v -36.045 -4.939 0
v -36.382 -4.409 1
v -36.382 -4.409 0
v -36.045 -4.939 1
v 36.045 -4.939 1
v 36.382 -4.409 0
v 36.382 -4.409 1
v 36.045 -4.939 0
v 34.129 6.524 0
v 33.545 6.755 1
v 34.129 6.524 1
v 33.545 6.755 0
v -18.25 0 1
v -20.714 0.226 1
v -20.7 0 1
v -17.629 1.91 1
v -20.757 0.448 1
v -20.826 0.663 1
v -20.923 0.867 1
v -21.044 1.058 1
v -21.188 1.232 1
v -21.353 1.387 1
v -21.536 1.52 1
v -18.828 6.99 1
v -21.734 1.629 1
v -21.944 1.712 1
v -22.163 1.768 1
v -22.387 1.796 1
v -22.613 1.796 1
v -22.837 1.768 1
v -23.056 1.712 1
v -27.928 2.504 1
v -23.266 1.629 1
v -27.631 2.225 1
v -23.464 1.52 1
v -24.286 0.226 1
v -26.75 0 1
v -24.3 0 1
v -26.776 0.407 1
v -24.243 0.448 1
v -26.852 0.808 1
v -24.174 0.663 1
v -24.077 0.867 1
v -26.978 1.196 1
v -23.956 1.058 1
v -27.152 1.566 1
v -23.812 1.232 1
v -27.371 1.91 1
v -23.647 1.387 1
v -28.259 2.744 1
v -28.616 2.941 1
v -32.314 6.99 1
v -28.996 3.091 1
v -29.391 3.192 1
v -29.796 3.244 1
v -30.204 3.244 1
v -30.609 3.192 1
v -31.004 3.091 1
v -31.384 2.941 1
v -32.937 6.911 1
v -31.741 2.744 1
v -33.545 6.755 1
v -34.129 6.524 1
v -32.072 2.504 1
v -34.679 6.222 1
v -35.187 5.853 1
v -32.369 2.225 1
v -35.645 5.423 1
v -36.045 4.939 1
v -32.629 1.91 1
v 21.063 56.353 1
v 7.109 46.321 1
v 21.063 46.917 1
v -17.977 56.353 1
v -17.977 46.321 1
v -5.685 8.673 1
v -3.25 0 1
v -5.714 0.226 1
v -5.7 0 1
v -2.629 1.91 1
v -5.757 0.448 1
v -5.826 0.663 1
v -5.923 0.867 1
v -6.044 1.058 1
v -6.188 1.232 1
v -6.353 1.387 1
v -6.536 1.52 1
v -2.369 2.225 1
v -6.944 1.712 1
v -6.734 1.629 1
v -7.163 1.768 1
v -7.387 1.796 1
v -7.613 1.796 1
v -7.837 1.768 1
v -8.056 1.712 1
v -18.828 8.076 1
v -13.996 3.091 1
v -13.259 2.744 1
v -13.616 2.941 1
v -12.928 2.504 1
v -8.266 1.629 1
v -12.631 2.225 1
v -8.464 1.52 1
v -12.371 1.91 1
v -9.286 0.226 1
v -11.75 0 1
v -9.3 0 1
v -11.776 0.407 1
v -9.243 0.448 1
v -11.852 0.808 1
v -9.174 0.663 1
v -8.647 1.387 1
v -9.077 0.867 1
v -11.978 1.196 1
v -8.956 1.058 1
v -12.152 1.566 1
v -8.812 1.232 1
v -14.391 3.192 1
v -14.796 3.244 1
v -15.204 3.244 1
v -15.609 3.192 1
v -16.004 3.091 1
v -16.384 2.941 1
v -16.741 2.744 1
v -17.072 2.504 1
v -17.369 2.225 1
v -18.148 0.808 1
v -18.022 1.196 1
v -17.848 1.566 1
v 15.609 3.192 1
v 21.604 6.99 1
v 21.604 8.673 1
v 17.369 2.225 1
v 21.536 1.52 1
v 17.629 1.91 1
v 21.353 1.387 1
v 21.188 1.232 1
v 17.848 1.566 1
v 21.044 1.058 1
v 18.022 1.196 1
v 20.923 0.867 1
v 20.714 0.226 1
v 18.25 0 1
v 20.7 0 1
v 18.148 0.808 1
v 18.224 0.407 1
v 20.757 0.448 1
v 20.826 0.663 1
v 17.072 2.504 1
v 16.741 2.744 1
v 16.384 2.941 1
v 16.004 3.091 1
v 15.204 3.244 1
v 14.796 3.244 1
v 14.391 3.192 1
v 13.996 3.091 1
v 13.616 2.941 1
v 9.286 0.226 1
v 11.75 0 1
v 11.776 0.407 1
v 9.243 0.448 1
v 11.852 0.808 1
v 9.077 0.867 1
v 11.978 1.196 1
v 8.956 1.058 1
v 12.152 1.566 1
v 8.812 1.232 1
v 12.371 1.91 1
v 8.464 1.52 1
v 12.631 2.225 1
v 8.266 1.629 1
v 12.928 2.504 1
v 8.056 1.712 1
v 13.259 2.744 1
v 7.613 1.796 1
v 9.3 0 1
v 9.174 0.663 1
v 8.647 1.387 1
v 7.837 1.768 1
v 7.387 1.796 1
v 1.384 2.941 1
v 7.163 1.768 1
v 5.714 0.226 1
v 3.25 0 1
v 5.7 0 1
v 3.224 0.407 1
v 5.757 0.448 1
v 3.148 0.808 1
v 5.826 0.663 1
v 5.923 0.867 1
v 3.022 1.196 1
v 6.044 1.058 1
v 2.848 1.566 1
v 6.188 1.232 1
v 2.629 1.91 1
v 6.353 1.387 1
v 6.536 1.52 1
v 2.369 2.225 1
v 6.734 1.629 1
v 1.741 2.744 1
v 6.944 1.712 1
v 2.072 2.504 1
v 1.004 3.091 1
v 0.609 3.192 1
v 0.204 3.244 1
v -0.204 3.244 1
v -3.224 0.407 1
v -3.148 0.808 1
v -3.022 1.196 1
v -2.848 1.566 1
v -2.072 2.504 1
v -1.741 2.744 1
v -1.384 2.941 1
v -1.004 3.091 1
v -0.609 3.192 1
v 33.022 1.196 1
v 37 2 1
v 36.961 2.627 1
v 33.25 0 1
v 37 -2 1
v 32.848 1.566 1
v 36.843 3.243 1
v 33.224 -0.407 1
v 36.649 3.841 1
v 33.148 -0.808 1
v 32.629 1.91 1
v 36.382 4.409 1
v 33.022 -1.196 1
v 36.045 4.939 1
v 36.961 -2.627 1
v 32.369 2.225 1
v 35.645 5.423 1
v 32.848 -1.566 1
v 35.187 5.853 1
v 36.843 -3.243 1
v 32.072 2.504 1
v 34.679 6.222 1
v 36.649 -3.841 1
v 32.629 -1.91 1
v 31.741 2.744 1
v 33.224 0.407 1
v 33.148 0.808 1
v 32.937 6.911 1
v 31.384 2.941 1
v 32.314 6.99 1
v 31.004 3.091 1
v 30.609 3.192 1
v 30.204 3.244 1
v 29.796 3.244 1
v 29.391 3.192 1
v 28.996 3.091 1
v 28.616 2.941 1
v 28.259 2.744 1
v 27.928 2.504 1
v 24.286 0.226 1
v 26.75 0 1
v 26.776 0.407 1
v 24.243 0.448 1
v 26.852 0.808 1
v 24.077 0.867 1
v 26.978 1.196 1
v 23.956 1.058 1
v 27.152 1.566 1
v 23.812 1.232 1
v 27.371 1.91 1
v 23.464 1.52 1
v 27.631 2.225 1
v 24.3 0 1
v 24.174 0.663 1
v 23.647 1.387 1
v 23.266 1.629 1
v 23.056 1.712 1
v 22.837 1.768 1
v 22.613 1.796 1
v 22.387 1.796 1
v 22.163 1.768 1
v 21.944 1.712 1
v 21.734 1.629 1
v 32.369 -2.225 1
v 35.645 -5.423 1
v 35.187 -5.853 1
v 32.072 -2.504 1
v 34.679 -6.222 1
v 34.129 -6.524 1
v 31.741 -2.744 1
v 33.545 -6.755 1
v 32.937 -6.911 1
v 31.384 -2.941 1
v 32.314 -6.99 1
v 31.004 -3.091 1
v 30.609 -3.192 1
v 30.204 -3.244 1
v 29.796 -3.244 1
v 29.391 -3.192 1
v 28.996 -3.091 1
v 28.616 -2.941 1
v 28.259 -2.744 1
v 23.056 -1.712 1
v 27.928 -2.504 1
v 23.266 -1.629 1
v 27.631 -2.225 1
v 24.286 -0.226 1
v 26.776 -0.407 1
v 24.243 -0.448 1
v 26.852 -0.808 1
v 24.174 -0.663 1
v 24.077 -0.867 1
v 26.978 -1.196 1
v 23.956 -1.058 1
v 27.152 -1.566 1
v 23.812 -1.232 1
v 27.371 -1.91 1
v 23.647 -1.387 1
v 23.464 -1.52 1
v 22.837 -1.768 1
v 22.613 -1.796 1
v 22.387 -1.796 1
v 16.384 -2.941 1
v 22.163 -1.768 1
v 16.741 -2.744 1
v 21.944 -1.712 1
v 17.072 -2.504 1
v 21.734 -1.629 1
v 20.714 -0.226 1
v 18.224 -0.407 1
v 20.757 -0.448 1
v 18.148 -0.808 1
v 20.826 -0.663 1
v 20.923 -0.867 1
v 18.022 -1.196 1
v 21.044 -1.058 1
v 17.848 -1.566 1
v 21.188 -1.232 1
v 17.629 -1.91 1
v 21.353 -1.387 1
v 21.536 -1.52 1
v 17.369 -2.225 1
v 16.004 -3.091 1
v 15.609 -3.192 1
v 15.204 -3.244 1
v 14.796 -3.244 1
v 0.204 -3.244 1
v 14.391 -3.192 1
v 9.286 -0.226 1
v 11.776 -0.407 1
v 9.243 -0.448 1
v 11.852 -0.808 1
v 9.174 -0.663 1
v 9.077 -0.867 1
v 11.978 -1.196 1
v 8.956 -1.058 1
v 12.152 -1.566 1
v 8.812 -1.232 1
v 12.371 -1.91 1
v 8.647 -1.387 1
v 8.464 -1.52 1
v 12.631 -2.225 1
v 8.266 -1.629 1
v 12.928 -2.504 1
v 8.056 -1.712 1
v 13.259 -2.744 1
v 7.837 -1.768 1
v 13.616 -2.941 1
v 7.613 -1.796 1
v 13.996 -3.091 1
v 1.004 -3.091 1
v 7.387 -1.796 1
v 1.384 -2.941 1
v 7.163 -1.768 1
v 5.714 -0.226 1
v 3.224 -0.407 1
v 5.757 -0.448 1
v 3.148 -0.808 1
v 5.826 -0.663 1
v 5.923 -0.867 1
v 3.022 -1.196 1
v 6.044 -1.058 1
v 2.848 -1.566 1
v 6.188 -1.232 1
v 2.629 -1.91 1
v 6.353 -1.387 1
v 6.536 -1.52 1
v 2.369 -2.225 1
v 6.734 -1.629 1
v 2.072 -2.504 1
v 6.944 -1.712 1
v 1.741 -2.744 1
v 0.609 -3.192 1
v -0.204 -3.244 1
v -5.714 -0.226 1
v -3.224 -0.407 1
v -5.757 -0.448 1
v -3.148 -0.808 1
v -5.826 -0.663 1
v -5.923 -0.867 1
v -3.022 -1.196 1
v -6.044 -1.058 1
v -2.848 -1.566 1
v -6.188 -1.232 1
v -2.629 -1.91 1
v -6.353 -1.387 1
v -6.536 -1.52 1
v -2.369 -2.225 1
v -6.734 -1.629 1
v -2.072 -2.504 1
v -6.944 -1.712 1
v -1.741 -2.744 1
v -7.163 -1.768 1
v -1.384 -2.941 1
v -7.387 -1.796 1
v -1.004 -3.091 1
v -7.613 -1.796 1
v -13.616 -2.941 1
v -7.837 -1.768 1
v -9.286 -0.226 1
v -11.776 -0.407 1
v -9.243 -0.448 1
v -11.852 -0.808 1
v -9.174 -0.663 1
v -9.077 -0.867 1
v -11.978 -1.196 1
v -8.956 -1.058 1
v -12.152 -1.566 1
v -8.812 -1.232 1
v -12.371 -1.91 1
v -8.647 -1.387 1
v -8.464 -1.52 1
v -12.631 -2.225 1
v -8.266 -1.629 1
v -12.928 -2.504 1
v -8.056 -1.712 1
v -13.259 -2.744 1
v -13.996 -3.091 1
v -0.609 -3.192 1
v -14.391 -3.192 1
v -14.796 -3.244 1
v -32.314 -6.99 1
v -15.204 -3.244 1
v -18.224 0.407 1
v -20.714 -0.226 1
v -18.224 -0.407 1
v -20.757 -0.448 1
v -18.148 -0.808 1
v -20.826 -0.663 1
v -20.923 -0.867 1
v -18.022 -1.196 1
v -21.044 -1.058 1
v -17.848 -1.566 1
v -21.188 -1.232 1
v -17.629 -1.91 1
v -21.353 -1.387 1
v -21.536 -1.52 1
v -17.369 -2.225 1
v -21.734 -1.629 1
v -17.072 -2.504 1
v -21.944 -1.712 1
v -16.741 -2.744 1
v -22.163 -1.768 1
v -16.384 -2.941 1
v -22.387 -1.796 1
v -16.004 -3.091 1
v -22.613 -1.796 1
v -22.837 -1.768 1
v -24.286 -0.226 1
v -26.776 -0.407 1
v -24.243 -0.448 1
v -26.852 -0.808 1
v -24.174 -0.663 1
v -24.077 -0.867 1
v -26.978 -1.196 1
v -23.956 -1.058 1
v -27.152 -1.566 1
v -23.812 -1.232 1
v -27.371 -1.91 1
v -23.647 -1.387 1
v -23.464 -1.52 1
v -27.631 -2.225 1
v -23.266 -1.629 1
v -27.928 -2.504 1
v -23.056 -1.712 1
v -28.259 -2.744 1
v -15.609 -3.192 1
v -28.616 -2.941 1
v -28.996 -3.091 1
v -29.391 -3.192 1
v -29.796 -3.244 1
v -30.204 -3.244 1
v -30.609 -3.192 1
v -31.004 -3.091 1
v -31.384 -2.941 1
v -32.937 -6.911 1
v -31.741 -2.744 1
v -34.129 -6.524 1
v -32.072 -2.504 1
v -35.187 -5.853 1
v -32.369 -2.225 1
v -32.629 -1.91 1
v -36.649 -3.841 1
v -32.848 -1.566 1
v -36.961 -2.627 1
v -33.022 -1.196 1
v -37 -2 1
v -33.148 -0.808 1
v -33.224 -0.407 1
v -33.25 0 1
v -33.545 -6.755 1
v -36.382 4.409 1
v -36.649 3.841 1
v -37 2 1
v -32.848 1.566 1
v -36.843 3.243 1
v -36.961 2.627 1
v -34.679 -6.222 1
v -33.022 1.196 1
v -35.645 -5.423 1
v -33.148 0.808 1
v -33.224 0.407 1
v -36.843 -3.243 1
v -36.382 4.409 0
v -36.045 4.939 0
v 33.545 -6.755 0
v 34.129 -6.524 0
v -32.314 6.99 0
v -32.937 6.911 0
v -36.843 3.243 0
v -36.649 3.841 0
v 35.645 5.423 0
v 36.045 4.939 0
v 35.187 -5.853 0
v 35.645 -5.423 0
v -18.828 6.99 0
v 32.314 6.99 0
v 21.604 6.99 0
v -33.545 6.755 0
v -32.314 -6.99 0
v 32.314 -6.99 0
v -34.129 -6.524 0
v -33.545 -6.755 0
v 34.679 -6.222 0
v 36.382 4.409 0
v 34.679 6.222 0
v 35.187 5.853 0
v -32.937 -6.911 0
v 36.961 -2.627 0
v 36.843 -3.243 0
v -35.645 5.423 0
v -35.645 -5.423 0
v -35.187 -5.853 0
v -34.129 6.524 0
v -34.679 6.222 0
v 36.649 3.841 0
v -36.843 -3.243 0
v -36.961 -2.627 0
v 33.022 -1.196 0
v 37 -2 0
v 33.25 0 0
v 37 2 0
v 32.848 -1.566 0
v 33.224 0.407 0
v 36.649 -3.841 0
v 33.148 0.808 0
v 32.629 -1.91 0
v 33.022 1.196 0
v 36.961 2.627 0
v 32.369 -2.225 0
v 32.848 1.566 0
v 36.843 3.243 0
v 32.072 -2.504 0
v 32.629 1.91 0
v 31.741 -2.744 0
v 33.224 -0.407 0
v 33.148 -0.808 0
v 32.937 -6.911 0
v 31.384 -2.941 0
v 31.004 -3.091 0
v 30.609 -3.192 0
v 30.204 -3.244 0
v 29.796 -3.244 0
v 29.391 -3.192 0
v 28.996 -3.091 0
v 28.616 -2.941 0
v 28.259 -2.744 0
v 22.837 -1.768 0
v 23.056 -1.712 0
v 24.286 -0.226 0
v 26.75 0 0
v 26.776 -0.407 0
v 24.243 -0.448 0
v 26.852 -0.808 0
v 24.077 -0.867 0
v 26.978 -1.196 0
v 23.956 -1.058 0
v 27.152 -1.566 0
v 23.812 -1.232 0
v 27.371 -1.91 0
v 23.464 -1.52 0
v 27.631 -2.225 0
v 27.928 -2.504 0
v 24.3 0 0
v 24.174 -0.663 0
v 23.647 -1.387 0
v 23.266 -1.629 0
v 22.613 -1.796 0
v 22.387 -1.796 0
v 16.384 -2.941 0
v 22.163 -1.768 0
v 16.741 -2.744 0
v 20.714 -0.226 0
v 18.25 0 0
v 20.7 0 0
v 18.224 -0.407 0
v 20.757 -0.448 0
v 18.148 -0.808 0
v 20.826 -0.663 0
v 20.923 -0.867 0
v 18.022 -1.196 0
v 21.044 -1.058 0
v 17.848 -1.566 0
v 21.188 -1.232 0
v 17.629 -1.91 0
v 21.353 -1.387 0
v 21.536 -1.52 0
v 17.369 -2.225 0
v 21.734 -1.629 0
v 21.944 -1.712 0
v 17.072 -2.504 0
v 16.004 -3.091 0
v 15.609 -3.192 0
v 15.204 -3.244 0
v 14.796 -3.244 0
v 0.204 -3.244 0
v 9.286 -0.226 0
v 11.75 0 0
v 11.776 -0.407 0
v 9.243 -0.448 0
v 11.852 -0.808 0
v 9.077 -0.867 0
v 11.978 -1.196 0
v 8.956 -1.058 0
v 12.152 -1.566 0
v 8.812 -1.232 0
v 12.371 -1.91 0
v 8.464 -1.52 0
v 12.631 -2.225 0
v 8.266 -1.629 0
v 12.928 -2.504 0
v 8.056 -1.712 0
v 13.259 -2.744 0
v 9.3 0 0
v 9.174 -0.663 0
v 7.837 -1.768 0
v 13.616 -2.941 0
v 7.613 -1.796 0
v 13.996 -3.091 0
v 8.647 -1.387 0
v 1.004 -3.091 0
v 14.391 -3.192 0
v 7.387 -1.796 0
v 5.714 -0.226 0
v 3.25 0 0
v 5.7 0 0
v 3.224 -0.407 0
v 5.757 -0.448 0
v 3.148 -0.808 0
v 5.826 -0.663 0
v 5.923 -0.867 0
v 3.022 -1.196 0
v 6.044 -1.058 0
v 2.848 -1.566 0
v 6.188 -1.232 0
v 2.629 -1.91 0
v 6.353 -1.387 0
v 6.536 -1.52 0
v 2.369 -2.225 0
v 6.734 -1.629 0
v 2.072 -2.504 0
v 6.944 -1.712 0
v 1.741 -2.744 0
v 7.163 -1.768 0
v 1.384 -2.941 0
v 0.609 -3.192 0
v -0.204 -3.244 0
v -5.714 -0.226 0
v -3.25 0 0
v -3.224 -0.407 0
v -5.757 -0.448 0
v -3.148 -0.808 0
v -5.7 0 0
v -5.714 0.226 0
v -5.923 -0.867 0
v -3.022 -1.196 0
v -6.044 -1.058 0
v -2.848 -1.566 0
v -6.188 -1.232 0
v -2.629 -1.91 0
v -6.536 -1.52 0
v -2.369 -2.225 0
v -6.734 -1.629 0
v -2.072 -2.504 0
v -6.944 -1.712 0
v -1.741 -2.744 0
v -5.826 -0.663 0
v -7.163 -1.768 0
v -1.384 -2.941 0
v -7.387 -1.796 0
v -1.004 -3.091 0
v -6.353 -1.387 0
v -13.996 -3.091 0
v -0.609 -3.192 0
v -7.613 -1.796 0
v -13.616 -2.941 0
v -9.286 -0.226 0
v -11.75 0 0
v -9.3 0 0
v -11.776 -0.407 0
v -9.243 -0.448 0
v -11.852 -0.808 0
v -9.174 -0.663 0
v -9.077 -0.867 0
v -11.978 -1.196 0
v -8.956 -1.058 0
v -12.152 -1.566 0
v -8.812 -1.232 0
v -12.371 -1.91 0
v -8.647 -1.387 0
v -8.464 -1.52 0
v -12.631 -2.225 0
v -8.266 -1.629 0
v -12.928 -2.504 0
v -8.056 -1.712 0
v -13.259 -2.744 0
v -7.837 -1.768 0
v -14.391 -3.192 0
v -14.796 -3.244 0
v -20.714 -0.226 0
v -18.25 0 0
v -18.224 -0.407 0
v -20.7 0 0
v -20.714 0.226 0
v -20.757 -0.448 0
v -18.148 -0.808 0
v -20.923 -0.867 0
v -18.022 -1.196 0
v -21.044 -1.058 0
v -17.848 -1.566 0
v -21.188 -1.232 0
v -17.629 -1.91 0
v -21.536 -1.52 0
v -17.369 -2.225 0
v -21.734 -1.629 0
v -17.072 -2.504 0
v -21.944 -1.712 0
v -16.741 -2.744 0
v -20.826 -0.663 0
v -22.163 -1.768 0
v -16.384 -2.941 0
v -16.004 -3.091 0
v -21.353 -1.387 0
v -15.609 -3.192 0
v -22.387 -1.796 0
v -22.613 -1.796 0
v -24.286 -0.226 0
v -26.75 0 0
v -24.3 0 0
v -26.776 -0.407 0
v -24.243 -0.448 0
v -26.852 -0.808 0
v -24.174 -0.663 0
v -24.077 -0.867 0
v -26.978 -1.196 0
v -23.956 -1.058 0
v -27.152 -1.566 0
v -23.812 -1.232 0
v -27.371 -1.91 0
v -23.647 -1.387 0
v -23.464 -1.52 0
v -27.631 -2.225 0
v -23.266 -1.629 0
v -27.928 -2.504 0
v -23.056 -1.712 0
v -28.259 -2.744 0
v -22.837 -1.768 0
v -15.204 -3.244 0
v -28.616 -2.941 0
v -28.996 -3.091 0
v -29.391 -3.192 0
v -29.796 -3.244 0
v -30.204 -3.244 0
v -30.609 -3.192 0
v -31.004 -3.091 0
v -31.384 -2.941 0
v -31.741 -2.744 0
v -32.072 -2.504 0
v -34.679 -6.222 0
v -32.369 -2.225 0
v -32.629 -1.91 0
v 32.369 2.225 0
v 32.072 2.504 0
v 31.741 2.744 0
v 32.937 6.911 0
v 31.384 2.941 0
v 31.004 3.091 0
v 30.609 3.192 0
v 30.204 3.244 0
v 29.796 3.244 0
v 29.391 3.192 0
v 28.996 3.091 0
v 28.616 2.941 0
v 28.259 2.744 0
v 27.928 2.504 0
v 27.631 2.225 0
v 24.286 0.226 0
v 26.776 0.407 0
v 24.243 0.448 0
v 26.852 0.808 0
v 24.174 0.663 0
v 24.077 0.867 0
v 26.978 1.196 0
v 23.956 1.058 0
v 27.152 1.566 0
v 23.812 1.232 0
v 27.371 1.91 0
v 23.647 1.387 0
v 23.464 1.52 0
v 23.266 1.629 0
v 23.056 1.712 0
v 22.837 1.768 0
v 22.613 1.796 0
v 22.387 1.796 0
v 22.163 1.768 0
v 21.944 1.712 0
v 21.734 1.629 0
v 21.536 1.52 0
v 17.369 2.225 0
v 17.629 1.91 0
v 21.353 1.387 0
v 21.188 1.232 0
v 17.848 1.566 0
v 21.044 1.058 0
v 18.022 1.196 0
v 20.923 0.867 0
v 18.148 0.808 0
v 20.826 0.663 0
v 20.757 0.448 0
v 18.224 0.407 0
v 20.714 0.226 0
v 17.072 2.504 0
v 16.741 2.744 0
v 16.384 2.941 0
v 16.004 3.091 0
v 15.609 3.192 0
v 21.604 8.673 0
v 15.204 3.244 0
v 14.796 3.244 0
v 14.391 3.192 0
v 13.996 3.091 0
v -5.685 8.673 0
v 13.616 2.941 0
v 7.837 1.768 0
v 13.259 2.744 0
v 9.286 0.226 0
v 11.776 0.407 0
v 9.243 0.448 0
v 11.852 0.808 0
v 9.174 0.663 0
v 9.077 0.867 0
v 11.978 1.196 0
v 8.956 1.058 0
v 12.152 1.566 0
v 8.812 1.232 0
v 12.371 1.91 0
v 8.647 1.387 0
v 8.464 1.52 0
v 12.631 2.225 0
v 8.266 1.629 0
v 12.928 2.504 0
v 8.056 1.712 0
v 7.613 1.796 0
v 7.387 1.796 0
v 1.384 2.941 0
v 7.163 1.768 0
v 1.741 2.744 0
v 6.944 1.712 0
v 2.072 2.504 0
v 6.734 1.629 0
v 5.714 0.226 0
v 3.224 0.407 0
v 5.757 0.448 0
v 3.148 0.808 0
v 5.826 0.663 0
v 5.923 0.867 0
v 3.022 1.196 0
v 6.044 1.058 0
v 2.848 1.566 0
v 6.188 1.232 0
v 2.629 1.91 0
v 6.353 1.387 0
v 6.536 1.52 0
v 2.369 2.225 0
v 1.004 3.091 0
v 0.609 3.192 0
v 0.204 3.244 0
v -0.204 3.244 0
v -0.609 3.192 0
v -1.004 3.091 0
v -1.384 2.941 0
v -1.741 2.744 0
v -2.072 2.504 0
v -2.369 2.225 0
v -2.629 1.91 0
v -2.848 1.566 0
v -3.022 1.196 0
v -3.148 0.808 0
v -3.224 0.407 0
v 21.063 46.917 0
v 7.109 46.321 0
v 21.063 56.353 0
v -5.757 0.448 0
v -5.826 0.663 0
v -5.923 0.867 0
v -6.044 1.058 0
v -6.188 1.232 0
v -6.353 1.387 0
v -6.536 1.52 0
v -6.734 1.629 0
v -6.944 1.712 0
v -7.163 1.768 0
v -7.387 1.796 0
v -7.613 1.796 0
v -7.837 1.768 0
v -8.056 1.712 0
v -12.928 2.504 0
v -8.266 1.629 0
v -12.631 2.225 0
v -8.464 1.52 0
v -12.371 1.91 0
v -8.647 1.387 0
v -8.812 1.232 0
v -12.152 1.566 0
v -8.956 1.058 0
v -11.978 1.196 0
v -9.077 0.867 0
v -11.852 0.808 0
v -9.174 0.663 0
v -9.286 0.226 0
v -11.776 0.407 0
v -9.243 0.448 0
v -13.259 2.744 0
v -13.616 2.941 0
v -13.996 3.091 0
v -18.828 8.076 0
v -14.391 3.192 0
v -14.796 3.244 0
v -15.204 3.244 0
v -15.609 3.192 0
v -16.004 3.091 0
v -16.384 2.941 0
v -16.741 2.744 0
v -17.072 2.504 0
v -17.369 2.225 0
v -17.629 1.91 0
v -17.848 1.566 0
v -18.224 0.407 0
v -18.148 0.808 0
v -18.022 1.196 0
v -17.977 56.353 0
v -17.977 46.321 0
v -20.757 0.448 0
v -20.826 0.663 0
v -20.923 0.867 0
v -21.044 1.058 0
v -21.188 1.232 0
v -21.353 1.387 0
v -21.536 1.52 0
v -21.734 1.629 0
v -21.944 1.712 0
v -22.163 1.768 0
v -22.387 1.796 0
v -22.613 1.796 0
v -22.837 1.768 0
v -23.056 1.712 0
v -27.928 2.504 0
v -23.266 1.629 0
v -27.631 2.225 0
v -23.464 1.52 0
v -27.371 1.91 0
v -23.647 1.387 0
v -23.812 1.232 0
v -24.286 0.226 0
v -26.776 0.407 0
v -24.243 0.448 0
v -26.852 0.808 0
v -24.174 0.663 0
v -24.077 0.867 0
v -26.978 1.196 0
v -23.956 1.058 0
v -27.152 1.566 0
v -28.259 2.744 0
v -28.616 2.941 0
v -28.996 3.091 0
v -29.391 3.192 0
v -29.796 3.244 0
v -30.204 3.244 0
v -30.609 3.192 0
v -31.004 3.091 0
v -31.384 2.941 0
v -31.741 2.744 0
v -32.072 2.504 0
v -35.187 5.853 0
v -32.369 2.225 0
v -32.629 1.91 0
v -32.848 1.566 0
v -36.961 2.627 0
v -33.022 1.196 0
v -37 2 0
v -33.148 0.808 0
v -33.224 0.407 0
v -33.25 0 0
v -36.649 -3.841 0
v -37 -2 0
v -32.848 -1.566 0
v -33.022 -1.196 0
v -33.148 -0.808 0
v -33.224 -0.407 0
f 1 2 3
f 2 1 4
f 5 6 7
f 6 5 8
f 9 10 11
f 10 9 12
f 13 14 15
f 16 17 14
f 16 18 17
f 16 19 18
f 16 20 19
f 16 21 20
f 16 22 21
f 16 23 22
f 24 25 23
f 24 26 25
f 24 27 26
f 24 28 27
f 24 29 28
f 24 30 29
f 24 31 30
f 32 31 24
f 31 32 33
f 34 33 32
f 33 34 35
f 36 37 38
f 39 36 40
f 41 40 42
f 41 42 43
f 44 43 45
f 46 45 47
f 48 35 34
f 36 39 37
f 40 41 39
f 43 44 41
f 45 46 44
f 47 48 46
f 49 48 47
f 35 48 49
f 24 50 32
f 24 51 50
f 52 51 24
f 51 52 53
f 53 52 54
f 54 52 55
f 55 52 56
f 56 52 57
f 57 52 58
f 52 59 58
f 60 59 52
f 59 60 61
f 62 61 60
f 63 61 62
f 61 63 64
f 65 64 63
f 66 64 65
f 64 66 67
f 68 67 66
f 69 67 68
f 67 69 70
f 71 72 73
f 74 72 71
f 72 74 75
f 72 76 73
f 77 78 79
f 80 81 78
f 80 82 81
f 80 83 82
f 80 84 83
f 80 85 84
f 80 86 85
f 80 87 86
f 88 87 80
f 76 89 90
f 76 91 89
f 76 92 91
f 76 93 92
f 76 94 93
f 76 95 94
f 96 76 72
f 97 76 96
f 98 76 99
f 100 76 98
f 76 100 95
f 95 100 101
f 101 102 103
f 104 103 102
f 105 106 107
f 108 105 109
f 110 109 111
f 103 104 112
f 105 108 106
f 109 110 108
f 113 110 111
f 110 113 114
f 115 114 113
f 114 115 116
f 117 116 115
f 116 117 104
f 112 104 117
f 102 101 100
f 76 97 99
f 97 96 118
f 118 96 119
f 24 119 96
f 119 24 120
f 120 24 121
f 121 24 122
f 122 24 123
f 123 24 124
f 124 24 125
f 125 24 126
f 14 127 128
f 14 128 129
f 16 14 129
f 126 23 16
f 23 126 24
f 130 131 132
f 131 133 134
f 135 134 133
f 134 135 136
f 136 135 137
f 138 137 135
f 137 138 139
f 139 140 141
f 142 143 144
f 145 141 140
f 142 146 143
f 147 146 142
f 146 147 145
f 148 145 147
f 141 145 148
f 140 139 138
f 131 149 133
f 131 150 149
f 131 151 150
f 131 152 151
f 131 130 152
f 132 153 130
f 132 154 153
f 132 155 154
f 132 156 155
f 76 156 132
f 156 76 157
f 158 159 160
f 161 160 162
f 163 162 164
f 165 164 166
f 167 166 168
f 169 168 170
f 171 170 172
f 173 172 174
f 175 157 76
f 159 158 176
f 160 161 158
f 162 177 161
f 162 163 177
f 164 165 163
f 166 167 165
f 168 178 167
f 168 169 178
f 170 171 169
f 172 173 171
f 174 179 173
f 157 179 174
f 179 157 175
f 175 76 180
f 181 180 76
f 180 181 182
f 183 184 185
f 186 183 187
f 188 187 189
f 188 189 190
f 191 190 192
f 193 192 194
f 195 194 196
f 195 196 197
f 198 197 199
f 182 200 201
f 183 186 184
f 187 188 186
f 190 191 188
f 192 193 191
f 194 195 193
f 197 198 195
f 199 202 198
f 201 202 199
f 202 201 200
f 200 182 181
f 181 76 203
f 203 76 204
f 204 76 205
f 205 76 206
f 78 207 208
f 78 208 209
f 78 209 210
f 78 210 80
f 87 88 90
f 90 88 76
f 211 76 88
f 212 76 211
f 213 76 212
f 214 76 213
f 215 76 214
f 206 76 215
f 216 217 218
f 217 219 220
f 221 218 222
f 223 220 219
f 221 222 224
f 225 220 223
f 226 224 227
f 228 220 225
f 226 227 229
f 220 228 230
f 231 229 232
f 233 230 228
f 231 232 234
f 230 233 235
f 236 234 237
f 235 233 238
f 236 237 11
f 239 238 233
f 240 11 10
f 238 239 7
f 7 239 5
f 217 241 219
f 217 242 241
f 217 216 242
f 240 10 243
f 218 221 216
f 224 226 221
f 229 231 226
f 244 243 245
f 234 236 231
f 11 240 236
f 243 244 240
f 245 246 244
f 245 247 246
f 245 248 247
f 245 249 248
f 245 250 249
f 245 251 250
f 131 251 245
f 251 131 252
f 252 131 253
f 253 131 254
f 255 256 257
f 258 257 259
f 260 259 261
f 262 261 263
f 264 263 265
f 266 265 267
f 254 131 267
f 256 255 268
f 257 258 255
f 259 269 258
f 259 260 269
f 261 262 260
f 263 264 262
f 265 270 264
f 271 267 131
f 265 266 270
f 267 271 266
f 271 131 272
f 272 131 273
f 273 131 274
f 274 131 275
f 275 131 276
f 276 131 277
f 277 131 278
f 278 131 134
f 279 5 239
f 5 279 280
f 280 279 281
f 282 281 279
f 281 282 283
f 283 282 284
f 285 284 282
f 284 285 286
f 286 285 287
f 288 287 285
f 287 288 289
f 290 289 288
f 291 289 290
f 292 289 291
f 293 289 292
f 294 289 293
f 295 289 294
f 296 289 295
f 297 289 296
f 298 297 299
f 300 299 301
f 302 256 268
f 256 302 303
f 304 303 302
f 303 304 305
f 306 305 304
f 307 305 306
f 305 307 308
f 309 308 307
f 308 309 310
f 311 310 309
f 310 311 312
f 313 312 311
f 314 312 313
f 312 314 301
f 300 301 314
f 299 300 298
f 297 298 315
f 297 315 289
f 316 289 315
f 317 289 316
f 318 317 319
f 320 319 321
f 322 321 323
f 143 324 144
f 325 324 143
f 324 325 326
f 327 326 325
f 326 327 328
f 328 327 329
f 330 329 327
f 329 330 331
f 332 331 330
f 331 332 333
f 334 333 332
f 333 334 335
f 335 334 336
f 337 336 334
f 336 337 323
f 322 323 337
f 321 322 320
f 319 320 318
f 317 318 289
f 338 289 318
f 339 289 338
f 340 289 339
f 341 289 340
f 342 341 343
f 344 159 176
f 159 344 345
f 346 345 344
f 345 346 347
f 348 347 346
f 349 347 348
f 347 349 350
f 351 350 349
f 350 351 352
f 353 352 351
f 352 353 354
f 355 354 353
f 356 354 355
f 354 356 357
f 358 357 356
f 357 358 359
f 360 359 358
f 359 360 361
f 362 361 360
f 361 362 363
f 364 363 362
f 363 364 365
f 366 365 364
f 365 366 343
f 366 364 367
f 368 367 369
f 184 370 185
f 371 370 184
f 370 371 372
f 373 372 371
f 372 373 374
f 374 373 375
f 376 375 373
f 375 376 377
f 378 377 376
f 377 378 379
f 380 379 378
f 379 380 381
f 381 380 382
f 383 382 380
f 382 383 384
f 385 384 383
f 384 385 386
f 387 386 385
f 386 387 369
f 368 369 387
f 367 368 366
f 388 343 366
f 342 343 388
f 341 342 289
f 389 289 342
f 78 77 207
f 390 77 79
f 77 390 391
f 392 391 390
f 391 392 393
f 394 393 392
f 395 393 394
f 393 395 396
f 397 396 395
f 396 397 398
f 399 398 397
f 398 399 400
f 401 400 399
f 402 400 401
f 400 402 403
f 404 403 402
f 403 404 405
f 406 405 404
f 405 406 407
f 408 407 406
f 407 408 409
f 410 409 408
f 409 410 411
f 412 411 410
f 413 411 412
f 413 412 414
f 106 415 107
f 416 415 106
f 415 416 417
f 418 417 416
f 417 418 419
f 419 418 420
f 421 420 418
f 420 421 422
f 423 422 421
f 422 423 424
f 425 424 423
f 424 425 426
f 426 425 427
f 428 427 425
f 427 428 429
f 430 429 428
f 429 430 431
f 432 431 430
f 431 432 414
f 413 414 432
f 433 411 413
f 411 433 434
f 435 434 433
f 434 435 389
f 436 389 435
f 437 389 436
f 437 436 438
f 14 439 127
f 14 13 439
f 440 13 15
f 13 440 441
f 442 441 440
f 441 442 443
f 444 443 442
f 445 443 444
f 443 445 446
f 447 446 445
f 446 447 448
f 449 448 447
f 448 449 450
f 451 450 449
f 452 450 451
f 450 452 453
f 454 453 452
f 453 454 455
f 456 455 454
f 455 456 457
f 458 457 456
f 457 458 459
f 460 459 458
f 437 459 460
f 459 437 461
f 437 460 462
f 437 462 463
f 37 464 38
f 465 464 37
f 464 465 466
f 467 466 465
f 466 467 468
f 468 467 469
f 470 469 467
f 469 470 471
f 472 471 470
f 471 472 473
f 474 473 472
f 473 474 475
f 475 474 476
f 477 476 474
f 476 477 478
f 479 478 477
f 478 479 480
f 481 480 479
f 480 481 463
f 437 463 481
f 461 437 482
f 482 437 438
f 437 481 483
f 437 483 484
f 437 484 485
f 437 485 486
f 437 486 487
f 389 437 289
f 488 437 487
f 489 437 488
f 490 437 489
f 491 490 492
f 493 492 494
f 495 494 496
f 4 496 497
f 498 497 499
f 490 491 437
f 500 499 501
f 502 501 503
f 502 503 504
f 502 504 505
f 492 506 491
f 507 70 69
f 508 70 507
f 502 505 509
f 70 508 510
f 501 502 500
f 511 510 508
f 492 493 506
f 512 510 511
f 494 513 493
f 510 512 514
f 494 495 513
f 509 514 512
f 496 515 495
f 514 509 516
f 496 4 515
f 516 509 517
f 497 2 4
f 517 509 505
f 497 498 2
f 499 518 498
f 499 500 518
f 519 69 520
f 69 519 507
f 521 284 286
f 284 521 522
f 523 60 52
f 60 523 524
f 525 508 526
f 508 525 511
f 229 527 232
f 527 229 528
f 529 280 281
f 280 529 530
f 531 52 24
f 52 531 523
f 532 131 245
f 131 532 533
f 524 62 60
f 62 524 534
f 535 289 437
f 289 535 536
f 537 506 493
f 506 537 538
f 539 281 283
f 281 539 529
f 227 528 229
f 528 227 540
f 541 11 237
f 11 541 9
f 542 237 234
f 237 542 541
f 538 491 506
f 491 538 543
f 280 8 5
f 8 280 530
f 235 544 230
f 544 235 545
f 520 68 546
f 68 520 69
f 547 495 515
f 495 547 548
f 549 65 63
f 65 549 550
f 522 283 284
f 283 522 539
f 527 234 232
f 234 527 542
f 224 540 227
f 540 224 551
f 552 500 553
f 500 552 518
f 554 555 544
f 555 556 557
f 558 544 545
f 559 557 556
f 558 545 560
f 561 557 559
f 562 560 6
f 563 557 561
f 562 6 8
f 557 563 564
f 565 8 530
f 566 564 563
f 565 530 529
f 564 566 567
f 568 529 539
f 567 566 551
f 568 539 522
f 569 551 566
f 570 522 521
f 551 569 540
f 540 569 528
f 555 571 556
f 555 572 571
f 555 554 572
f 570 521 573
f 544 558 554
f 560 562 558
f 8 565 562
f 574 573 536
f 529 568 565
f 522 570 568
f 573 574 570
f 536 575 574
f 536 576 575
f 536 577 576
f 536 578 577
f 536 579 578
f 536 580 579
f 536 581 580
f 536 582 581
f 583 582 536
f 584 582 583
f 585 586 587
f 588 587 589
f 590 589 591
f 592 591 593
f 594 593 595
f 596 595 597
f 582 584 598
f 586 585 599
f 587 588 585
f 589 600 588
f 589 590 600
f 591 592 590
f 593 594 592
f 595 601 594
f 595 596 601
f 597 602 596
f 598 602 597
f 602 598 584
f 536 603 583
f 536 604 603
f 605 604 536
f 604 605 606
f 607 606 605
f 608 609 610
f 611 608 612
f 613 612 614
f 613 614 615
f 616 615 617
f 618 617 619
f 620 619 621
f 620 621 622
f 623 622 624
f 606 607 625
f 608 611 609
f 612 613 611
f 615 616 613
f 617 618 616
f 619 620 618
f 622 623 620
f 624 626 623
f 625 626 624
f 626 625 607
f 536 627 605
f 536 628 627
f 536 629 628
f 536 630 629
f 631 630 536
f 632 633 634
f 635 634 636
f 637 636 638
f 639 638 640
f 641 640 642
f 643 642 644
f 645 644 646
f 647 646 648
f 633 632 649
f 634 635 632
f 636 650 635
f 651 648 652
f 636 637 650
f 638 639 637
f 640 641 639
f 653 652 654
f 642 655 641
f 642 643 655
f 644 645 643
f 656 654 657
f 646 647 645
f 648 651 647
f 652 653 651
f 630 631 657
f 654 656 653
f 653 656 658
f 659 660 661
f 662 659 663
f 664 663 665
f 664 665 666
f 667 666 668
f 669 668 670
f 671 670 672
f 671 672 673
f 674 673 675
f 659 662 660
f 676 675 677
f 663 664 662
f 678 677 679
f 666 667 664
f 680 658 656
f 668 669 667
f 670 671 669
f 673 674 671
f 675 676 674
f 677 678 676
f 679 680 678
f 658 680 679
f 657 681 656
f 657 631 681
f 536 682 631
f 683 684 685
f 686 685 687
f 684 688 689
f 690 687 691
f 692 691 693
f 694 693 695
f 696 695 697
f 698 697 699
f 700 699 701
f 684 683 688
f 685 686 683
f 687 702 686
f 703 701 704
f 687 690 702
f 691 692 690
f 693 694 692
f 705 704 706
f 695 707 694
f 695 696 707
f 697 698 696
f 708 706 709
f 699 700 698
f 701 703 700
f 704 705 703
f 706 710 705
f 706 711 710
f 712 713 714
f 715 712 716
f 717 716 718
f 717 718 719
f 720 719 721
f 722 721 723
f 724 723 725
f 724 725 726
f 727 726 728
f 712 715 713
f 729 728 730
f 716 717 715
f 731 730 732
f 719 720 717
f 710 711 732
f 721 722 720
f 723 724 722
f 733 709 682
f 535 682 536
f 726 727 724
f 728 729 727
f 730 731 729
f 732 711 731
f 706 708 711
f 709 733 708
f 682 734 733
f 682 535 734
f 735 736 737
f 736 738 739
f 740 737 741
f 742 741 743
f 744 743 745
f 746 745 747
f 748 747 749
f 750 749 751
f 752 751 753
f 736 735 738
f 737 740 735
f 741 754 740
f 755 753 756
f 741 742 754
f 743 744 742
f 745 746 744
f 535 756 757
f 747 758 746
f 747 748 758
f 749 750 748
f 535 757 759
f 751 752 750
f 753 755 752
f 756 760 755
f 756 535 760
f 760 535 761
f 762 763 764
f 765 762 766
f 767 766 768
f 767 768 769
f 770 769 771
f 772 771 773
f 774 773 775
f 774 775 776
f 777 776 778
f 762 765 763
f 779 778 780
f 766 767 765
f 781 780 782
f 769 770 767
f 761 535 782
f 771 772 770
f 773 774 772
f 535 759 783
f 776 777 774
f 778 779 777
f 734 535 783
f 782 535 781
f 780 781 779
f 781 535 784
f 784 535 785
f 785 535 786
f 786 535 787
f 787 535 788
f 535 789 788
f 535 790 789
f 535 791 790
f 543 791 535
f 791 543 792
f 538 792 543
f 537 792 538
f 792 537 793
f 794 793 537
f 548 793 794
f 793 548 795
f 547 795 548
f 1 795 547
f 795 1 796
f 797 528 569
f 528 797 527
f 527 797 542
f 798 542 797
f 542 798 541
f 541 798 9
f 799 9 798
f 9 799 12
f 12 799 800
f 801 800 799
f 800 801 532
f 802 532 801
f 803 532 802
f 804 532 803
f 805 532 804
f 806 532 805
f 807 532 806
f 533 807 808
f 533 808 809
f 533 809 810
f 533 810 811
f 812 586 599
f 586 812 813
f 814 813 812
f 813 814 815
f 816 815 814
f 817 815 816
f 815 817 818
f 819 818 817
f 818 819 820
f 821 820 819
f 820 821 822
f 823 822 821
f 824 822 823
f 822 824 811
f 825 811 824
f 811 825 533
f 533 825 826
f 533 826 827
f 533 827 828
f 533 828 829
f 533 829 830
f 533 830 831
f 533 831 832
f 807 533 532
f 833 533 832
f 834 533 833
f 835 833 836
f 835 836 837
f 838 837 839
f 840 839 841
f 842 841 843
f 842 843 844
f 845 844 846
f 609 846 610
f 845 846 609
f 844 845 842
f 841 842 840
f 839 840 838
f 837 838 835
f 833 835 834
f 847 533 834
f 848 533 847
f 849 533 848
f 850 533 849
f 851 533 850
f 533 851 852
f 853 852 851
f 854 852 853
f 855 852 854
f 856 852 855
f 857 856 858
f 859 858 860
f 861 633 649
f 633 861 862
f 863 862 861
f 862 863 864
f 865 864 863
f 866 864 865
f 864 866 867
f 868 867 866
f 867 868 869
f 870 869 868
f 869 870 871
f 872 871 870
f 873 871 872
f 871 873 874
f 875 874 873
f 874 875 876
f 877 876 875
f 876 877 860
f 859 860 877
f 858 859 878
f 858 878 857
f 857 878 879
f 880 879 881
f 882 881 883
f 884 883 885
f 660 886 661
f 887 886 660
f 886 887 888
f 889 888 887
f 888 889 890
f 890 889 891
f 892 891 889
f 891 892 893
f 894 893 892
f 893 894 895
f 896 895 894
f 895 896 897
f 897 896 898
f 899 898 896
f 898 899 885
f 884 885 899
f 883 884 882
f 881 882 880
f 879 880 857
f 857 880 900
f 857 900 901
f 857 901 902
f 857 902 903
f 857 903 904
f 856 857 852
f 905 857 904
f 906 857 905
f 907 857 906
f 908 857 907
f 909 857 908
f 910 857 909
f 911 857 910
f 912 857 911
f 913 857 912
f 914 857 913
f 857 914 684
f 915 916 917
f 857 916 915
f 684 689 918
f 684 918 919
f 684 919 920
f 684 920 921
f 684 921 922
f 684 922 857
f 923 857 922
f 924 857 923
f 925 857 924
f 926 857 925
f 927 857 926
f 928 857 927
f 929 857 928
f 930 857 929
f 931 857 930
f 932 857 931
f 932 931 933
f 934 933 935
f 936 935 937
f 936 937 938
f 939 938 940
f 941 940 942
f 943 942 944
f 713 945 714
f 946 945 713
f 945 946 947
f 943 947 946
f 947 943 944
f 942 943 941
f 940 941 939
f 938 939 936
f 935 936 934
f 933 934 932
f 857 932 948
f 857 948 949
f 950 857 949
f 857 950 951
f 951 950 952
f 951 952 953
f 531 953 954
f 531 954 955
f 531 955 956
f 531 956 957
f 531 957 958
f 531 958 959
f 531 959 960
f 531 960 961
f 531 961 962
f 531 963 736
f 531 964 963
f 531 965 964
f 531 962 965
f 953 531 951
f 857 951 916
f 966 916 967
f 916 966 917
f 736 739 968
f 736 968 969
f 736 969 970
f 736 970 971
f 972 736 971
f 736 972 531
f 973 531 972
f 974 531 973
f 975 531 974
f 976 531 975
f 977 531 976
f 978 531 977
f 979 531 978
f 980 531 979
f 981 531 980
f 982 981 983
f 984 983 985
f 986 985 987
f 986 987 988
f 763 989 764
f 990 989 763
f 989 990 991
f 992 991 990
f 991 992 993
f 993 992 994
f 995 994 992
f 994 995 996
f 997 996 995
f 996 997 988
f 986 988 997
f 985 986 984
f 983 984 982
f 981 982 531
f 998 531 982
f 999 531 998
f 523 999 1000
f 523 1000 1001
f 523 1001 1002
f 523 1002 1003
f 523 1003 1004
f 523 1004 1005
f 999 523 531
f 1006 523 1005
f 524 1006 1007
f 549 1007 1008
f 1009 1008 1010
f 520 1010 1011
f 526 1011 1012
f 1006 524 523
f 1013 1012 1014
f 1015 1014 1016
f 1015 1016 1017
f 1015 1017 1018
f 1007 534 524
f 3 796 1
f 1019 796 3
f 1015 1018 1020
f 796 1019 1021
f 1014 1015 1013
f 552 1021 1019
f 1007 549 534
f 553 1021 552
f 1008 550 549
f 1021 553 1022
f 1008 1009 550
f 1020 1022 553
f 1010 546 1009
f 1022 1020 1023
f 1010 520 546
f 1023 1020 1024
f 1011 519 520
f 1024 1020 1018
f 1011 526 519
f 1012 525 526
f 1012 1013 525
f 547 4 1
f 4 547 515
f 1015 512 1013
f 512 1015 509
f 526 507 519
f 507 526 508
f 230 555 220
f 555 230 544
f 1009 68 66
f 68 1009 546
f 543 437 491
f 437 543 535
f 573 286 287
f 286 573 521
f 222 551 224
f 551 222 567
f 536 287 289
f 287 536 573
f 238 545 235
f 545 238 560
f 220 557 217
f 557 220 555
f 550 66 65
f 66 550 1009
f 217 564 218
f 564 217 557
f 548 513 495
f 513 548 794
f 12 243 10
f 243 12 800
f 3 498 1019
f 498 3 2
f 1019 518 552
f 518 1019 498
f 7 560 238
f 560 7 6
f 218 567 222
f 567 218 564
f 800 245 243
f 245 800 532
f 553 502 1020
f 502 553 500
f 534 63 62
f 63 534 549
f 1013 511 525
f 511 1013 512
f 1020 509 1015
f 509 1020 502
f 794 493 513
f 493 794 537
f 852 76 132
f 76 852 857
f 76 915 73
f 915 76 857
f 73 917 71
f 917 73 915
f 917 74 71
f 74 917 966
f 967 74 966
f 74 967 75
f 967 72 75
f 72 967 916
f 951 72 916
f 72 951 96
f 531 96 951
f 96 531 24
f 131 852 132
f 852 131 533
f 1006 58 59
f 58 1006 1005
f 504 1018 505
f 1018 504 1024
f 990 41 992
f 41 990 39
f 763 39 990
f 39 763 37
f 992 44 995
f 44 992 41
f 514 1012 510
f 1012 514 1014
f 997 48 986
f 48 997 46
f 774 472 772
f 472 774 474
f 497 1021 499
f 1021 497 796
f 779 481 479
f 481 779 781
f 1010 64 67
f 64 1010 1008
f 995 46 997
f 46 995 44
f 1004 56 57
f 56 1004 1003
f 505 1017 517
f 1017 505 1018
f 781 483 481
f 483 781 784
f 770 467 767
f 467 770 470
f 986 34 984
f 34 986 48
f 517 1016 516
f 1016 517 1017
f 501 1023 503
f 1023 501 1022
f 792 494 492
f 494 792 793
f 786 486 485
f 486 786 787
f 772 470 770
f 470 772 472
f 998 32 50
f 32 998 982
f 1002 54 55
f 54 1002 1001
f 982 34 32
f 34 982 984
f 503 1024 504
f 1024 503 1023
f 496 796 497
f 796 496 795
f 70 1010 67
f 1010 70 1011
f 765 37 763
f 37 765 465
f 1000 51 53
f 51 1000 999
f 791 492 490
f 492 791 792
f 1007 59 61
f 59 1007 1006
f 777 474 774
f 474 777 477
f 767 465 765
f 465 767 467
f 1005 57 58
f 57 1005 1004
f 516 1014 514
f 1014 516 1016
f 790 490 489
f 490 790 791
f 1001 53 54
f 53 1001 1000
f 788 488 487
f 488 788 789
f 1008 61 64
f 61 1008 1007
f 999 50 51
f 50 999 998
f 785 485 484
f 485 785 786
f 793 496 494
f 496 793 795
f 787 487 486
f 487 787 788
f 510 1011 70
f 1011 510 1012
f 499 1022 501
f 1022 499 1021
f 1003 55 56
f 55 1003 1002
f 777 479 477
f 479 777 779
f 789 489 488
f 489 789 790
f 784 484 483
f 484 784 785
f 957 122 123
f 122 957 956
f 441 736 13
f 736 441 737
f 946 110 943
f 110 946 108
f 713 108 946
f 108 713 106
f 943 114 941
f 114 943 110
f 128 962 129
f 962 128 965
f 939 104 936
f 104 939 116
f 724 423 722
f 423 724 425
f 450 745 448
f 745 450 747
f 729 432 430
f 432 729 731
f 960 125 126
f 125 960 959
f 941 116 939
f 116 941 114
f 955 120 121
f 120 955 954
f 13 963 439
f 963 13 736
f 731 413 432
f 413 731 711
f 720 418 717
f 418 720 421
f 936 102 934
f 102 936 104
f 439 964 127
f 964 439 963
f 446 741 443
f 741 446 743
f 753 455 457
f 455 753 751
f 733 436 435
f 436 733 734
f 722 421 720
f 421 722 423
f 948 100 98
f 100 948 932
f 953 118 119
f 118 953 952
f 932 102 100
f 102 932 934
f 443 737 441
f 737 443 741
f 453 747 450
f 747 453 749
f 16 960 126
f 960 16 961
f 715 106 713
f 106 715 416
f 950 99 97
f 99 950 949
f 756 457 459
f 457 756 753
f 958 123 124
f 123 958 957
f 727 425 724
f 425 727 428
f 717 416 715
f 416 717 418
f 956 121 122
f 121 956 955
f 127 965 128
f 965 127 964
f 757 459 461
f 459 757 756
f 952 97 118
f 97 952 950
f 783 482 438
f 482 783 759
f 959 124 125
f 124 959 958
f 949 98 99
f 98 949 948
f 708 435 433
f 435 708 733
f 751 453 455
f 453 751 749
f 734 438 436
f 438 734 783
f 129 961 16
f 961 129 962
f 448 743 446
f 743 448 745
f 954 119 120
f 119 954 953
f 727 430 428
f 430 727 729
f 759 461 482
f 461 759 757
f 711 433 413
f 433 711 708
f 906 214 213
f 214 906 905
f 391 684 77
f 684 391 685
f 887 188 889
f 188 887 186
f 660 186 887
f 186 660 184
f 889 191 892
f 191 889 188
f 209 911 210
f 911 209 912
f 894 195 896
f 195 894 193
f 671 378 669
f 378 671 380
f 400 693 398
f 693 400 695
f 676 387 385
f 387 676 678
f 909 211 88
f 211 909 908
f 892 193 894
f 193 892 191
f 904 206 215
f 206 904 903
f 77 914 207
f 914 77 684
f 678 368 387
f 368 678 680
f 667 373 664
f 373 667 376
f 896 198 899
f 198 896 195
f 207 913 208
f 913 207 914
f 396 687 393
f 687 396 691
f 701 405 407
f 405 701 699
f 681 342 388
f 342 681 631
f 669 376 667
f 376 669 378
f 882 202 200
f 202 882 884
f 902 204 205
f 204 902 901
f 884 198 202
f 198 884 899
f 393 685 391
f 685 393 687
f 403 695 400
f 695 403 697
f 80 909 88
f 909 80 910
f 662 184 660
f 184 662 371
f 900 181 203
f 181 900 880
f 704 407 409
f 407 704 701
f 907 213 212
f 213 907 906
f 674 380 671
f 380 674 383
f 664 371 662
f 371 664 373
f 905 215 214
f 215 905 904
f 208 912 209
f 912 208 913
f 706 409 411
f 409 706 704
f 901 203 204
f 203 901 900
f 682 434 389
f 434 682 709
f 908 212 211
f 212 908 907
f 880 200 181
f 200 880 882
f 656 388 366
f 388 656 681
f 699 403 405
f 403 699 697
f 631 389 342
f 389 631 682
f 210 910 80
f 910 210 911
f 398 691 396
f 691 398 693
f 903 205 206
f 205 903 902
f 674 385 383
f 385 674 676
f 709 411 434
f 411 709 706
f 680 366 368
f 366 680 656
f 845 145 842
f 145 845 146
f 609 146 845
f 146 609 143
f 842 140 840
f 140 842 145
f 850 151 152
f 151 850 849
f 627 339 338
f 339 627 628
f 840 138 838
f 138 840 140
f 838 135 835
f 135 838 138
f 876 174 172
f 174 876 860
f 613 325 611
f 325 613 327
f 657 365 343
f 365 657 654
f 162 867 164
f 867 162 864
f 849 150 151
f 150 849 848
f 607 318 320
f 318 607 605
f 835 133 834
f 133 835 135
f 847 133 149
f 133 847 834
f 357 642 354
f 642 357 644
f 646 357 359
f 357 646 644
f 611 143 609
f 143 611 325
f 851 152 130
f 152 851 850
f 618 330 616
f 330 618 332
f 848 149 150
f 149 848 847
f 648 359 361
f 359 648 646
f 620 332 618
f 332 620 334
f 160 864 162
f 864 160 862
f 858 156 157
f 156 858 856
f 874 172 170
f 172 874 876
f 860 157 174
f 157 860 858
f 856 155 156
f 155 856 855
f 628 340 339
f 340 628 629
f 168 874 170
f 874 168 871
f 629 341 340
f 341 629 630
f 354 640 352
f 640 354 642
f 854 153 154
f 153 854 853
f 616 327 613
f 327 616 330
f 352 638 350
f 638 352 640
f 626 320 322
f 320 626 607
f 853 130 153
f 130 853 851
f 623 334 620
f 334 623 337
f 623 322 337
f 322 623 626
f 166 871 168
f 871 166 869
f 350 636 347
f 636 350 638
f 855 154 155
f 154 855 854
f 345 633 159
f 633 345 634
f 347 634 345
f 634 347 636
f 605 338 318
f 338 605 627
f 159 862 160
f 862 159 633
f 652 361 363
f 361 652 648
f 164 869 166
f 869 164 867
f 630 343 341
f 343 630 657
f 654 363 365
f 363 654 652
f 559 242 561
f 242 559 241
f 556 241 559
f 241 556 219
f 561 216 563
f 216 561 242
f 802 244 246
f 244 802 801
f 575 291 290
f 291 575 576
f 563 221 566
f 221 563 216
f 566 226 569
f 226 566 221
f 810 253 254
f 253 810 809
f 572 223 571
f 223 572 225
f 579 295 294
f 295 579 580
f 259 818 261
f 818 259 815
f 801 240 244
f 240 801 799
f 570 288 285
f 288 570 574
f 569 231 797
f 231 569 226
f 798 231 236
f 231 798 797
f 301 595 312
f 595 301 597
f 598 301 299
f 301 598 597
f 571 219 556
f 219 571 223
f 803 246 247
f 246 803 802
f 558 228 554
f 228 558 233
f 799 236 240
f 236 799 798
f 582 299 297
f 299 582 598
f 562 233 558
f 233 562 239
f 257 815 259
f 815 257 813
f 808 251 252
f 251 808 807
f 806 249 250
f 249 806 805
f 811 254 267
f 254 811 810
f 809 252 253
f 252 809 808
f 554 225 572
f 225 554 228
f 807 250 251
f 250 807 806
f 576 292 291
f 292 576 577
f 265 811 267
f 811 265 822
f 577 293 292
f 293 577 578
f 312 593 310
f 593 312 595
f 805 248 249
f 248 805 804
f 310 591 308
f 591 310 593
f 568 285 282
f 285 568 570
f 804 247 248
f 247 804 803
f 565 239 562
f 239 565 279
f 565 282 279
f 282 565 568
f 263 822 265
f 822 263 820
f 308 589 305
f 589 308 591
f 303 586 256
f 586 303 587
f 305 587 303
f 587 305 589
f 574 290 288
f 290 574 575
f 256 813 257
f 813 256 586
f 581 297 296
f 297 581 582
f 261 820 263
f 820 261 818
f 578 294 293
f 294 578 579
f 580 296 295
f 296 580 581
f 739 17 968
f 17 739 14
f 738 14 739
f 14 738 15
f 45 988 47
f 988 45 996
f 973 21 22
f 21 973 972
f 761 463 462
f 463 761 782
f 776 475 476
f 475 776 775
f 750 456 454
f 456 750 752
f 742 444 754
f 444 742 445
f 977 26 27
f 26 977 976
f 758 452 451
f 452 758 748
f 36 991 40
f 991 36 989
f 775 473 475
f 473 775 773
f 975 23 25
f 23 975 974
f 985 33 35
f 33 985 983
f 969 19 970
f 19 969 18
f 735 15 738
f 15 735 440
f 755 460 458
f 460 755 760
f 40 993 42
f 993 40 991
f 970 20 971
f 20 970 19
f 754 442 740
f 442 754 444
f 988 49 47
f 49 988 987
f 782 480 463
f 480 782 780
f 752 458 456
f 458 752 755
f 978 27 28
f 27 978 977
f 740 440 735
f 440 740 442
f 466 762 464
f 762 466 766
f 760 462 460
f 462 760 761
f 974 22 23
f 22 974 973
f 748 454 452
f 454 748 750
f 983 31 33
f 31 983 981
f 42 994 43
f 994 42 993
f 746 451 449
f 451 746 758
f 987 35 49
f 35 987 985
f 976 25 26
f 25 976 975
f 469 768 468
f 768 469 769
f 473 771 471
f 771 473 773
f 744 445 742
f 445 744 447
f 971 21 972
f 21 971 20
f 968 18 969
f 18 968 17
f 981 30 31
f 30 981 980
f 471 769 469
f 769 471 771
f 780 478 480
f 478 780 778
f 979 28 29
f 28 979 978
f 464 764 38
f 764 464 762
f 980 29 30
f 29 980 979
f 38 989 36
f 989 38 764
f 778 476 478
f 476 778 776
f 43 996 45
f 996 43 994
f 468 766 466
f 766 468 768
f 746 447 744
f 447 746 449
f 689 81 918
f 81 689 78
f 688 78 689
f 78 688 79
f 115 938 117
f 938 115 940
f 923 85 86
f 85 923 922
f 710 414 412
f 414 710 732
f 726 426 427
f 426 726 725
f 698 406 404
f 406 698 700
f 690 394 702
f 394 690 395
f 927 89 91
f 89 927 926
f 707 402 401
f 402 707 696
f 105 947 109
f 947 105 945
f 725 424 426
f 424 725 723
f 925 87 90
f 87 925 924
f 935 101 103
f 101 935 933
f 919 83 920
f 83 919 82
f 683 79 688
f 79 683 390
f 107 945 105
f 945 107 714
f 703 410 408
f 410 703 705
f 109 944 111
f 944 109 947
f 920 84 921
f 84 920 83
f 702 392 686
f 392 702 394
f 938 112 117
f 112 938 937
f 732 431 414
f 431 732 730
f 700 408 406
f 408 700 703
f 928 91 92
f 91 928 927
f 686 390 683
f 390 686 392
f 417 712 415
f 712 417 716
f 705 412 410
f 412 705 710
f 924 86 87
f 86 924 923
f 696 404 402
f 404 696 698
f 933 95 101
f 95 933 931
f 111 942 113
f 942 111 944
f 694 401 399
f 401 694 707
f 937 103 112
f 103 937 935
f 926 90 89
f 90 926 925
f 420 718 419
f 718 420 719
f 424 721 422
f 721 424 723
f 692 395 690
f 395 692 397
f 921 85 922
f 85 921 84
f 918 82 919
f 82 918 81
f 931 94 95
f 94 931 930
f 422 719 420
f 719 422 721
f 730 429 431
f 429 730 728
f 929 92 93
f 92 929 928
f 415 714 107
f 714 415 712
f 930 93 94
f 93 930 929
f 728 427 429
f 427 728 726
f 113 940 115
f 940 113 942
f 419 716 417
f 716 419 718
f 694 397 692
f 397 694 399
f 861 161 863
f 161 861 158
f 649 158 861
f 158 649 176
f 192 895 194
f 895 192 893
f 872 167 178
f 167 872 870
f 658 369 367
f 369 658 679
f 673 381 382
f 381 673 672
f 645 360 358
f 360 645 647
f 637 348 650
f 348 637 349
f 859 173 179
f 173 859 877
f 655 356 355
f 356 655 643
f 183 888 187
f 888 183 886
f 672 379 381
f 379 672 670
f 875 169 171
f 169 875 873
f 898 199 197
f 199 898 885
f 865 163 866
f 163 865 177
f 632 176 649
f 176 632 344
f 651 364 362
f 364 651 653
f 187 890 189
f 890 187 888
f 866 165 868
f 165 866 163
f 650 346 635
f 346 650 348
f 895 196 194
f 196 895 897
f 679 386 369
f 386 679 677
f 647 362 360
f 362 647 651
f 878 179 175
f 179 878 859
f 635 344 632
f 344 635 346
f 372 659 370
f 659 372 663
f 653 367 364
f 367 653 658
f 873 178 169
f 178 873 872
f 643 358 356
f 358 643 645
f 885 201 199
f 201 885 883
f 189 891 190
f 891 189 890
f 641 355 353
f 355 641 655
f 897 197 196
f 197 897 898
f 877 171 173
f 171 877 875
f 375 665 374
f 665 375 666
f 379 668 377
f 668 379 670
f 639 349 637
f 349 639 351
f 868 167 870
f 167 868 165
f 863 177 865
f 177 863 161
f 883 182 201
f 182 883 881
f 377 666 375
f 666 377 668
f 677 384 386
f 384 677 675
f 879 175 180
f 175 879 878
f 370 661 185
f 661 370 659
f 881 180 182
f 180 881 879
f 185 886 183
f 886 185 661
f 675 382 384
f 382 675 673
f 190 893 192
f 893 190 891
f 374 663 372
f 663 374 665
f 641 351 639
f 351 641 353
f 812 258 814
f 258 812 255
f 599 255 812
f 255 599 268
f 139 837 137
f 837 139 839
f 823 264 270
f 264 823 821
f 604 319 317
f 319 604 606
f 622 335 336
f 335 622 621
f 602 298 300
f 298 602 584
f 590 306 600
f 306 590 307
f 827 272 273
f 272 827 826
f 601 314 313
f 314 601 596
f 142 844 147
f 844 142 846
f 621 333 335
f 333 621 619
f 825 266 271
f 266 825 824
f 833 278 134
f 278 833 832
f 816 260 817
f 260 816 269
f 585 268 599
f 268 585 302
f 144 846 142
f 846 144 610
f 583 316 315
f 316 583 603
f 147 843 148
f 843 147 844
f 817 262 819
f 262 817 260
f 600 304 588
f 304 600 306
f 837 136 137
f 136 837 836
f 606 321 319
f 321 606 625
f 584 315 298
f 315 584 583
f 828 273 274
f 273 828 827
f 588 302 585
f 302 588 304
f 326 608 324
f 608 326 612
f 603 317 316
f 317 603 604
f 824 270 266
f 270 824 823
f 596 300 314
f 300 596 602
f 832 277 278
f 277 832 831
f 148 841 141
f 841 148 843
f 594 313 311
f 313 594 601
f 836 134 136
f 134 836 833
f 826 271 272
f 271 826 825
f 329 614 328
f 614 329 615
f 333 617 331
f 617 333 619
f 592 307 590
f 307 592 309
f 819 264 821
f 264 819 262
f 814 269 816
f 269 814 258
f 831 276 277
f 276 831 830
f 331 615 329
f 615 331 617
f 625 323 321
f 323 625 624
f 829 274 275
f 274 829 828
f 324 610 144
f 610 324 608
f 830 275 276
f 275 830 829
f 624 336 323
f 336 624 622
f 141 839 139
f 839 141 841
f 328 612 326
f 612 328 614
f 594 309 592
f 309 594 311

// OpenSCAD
$fn = 50;


difference() {
	union() {
		hull() {
			translate(v = [-32.0000000000, 2.0000000000, 0]) {
				cylinder(h = 1, r = 5);
			}
			translate(v = [32.0000000000, 2.0000000000, 0]) {
				cylinder(h = 1, r = 5);
			}
			translate(v = [-32.0000000000, -2.0000000000, 0]) {
				cylinder(h = 1, r = 5);
			}
			translate(v = [32.0000000000, -2.0000000000, 0]) {
				cylinder(h = 1, r = 5);
			}
		}
		translate(v = [0, 55, 0]) {
			linear_extrude(height = 1) {
				text(font = "DejaVu Sans Mono:style=Bold", halign = "center", size = 57.0000000000, text = "Z", valign = "top");
			}
		}
	}
	union() {
		translate(v = [-30.0000000000, 0.0000000000, 0]) {
			translate(v = [0, 0, -100]) {
				cylinder(h = 200, r = 3.2500000000);
			}
		}
		translate(v = [-15.0000000000, 0.0000000000, 0]) {
			translate(v = [0, 0, -100]) {
				cylinder(h = 200, r = 3.2500000000);
			}
		}
		translate(v = [0, 0, -100]) {
			cylinder(h = 200, r = 3.2500000000);
		}
		translate(v = [15.0000000000, 0.0000000000, 0]) {
			translate(v = [0, 0, -100]) {
				cylinder(h = 200, r = 3.2500000000);
			}
		}
		translate(v = [30.0000000000, 0.0000000000, 0]) {
			translate(v = [0, 0, -100]) {
				cylinder(h = 200, r = 3.2500000000);
			}
		}
		translate(v = [-30.0000000000, 0.0000000000, 0]) {
			translate(v = [0, 0, -100]) {
				cylinder(h = 200, r = 1.8000000000);
			}
		}
		translate(v = [-22.5000000000, 0.0000000000, 0]) {
			translate(v = [0, 0, -100]) {
				cylinder(h = 200, r = 1.8000000000);
			}
		}
		translate(v = [-15.0000000000, 0.0000000000, 0]) {
			translate(v = [0, 0, -100]) {
				cylinder(h = 200, r = 1.8000000000);
			}
		}
		translate(v = [-7.5000000000, 0.0000000000, 0]) {
			translate(v = [0, 0, -100]) {
				cylinder(h = 200, r = 1.8000000000);
			}
		}
		translate(v = [0, 0, -100]) {
			cylinder(h = 200, r = 1.8000000000);
		}
		translate(v = [7.5000000000, 0.0000000000, 0]) {
			translate(v = [0, 0, -100]) {
				cylinder(h = 200, r = 1.8000000000);
			}
		}
		translate(v = [15.0000000000, 0.0000000000, 0]) {
			translate(v = [0, 0, -100]) {
				cylinder(h = 200, r = 1.8000000000);
			}
		}
		translate(v = [22.5000000000, 0.0000000000, 0]) {
			translate(v = [0, 0, -100]) {
				cylinder(h = 200, r = 1.8000000000);
			}
		}
		translate(v = [30.0000000000, 0.0000000000, 0]) {
			translate(v = [0, 0, -100]) {
				cylinder(h = 200, r = 1.8000000000);
			}
		}
	}
}
